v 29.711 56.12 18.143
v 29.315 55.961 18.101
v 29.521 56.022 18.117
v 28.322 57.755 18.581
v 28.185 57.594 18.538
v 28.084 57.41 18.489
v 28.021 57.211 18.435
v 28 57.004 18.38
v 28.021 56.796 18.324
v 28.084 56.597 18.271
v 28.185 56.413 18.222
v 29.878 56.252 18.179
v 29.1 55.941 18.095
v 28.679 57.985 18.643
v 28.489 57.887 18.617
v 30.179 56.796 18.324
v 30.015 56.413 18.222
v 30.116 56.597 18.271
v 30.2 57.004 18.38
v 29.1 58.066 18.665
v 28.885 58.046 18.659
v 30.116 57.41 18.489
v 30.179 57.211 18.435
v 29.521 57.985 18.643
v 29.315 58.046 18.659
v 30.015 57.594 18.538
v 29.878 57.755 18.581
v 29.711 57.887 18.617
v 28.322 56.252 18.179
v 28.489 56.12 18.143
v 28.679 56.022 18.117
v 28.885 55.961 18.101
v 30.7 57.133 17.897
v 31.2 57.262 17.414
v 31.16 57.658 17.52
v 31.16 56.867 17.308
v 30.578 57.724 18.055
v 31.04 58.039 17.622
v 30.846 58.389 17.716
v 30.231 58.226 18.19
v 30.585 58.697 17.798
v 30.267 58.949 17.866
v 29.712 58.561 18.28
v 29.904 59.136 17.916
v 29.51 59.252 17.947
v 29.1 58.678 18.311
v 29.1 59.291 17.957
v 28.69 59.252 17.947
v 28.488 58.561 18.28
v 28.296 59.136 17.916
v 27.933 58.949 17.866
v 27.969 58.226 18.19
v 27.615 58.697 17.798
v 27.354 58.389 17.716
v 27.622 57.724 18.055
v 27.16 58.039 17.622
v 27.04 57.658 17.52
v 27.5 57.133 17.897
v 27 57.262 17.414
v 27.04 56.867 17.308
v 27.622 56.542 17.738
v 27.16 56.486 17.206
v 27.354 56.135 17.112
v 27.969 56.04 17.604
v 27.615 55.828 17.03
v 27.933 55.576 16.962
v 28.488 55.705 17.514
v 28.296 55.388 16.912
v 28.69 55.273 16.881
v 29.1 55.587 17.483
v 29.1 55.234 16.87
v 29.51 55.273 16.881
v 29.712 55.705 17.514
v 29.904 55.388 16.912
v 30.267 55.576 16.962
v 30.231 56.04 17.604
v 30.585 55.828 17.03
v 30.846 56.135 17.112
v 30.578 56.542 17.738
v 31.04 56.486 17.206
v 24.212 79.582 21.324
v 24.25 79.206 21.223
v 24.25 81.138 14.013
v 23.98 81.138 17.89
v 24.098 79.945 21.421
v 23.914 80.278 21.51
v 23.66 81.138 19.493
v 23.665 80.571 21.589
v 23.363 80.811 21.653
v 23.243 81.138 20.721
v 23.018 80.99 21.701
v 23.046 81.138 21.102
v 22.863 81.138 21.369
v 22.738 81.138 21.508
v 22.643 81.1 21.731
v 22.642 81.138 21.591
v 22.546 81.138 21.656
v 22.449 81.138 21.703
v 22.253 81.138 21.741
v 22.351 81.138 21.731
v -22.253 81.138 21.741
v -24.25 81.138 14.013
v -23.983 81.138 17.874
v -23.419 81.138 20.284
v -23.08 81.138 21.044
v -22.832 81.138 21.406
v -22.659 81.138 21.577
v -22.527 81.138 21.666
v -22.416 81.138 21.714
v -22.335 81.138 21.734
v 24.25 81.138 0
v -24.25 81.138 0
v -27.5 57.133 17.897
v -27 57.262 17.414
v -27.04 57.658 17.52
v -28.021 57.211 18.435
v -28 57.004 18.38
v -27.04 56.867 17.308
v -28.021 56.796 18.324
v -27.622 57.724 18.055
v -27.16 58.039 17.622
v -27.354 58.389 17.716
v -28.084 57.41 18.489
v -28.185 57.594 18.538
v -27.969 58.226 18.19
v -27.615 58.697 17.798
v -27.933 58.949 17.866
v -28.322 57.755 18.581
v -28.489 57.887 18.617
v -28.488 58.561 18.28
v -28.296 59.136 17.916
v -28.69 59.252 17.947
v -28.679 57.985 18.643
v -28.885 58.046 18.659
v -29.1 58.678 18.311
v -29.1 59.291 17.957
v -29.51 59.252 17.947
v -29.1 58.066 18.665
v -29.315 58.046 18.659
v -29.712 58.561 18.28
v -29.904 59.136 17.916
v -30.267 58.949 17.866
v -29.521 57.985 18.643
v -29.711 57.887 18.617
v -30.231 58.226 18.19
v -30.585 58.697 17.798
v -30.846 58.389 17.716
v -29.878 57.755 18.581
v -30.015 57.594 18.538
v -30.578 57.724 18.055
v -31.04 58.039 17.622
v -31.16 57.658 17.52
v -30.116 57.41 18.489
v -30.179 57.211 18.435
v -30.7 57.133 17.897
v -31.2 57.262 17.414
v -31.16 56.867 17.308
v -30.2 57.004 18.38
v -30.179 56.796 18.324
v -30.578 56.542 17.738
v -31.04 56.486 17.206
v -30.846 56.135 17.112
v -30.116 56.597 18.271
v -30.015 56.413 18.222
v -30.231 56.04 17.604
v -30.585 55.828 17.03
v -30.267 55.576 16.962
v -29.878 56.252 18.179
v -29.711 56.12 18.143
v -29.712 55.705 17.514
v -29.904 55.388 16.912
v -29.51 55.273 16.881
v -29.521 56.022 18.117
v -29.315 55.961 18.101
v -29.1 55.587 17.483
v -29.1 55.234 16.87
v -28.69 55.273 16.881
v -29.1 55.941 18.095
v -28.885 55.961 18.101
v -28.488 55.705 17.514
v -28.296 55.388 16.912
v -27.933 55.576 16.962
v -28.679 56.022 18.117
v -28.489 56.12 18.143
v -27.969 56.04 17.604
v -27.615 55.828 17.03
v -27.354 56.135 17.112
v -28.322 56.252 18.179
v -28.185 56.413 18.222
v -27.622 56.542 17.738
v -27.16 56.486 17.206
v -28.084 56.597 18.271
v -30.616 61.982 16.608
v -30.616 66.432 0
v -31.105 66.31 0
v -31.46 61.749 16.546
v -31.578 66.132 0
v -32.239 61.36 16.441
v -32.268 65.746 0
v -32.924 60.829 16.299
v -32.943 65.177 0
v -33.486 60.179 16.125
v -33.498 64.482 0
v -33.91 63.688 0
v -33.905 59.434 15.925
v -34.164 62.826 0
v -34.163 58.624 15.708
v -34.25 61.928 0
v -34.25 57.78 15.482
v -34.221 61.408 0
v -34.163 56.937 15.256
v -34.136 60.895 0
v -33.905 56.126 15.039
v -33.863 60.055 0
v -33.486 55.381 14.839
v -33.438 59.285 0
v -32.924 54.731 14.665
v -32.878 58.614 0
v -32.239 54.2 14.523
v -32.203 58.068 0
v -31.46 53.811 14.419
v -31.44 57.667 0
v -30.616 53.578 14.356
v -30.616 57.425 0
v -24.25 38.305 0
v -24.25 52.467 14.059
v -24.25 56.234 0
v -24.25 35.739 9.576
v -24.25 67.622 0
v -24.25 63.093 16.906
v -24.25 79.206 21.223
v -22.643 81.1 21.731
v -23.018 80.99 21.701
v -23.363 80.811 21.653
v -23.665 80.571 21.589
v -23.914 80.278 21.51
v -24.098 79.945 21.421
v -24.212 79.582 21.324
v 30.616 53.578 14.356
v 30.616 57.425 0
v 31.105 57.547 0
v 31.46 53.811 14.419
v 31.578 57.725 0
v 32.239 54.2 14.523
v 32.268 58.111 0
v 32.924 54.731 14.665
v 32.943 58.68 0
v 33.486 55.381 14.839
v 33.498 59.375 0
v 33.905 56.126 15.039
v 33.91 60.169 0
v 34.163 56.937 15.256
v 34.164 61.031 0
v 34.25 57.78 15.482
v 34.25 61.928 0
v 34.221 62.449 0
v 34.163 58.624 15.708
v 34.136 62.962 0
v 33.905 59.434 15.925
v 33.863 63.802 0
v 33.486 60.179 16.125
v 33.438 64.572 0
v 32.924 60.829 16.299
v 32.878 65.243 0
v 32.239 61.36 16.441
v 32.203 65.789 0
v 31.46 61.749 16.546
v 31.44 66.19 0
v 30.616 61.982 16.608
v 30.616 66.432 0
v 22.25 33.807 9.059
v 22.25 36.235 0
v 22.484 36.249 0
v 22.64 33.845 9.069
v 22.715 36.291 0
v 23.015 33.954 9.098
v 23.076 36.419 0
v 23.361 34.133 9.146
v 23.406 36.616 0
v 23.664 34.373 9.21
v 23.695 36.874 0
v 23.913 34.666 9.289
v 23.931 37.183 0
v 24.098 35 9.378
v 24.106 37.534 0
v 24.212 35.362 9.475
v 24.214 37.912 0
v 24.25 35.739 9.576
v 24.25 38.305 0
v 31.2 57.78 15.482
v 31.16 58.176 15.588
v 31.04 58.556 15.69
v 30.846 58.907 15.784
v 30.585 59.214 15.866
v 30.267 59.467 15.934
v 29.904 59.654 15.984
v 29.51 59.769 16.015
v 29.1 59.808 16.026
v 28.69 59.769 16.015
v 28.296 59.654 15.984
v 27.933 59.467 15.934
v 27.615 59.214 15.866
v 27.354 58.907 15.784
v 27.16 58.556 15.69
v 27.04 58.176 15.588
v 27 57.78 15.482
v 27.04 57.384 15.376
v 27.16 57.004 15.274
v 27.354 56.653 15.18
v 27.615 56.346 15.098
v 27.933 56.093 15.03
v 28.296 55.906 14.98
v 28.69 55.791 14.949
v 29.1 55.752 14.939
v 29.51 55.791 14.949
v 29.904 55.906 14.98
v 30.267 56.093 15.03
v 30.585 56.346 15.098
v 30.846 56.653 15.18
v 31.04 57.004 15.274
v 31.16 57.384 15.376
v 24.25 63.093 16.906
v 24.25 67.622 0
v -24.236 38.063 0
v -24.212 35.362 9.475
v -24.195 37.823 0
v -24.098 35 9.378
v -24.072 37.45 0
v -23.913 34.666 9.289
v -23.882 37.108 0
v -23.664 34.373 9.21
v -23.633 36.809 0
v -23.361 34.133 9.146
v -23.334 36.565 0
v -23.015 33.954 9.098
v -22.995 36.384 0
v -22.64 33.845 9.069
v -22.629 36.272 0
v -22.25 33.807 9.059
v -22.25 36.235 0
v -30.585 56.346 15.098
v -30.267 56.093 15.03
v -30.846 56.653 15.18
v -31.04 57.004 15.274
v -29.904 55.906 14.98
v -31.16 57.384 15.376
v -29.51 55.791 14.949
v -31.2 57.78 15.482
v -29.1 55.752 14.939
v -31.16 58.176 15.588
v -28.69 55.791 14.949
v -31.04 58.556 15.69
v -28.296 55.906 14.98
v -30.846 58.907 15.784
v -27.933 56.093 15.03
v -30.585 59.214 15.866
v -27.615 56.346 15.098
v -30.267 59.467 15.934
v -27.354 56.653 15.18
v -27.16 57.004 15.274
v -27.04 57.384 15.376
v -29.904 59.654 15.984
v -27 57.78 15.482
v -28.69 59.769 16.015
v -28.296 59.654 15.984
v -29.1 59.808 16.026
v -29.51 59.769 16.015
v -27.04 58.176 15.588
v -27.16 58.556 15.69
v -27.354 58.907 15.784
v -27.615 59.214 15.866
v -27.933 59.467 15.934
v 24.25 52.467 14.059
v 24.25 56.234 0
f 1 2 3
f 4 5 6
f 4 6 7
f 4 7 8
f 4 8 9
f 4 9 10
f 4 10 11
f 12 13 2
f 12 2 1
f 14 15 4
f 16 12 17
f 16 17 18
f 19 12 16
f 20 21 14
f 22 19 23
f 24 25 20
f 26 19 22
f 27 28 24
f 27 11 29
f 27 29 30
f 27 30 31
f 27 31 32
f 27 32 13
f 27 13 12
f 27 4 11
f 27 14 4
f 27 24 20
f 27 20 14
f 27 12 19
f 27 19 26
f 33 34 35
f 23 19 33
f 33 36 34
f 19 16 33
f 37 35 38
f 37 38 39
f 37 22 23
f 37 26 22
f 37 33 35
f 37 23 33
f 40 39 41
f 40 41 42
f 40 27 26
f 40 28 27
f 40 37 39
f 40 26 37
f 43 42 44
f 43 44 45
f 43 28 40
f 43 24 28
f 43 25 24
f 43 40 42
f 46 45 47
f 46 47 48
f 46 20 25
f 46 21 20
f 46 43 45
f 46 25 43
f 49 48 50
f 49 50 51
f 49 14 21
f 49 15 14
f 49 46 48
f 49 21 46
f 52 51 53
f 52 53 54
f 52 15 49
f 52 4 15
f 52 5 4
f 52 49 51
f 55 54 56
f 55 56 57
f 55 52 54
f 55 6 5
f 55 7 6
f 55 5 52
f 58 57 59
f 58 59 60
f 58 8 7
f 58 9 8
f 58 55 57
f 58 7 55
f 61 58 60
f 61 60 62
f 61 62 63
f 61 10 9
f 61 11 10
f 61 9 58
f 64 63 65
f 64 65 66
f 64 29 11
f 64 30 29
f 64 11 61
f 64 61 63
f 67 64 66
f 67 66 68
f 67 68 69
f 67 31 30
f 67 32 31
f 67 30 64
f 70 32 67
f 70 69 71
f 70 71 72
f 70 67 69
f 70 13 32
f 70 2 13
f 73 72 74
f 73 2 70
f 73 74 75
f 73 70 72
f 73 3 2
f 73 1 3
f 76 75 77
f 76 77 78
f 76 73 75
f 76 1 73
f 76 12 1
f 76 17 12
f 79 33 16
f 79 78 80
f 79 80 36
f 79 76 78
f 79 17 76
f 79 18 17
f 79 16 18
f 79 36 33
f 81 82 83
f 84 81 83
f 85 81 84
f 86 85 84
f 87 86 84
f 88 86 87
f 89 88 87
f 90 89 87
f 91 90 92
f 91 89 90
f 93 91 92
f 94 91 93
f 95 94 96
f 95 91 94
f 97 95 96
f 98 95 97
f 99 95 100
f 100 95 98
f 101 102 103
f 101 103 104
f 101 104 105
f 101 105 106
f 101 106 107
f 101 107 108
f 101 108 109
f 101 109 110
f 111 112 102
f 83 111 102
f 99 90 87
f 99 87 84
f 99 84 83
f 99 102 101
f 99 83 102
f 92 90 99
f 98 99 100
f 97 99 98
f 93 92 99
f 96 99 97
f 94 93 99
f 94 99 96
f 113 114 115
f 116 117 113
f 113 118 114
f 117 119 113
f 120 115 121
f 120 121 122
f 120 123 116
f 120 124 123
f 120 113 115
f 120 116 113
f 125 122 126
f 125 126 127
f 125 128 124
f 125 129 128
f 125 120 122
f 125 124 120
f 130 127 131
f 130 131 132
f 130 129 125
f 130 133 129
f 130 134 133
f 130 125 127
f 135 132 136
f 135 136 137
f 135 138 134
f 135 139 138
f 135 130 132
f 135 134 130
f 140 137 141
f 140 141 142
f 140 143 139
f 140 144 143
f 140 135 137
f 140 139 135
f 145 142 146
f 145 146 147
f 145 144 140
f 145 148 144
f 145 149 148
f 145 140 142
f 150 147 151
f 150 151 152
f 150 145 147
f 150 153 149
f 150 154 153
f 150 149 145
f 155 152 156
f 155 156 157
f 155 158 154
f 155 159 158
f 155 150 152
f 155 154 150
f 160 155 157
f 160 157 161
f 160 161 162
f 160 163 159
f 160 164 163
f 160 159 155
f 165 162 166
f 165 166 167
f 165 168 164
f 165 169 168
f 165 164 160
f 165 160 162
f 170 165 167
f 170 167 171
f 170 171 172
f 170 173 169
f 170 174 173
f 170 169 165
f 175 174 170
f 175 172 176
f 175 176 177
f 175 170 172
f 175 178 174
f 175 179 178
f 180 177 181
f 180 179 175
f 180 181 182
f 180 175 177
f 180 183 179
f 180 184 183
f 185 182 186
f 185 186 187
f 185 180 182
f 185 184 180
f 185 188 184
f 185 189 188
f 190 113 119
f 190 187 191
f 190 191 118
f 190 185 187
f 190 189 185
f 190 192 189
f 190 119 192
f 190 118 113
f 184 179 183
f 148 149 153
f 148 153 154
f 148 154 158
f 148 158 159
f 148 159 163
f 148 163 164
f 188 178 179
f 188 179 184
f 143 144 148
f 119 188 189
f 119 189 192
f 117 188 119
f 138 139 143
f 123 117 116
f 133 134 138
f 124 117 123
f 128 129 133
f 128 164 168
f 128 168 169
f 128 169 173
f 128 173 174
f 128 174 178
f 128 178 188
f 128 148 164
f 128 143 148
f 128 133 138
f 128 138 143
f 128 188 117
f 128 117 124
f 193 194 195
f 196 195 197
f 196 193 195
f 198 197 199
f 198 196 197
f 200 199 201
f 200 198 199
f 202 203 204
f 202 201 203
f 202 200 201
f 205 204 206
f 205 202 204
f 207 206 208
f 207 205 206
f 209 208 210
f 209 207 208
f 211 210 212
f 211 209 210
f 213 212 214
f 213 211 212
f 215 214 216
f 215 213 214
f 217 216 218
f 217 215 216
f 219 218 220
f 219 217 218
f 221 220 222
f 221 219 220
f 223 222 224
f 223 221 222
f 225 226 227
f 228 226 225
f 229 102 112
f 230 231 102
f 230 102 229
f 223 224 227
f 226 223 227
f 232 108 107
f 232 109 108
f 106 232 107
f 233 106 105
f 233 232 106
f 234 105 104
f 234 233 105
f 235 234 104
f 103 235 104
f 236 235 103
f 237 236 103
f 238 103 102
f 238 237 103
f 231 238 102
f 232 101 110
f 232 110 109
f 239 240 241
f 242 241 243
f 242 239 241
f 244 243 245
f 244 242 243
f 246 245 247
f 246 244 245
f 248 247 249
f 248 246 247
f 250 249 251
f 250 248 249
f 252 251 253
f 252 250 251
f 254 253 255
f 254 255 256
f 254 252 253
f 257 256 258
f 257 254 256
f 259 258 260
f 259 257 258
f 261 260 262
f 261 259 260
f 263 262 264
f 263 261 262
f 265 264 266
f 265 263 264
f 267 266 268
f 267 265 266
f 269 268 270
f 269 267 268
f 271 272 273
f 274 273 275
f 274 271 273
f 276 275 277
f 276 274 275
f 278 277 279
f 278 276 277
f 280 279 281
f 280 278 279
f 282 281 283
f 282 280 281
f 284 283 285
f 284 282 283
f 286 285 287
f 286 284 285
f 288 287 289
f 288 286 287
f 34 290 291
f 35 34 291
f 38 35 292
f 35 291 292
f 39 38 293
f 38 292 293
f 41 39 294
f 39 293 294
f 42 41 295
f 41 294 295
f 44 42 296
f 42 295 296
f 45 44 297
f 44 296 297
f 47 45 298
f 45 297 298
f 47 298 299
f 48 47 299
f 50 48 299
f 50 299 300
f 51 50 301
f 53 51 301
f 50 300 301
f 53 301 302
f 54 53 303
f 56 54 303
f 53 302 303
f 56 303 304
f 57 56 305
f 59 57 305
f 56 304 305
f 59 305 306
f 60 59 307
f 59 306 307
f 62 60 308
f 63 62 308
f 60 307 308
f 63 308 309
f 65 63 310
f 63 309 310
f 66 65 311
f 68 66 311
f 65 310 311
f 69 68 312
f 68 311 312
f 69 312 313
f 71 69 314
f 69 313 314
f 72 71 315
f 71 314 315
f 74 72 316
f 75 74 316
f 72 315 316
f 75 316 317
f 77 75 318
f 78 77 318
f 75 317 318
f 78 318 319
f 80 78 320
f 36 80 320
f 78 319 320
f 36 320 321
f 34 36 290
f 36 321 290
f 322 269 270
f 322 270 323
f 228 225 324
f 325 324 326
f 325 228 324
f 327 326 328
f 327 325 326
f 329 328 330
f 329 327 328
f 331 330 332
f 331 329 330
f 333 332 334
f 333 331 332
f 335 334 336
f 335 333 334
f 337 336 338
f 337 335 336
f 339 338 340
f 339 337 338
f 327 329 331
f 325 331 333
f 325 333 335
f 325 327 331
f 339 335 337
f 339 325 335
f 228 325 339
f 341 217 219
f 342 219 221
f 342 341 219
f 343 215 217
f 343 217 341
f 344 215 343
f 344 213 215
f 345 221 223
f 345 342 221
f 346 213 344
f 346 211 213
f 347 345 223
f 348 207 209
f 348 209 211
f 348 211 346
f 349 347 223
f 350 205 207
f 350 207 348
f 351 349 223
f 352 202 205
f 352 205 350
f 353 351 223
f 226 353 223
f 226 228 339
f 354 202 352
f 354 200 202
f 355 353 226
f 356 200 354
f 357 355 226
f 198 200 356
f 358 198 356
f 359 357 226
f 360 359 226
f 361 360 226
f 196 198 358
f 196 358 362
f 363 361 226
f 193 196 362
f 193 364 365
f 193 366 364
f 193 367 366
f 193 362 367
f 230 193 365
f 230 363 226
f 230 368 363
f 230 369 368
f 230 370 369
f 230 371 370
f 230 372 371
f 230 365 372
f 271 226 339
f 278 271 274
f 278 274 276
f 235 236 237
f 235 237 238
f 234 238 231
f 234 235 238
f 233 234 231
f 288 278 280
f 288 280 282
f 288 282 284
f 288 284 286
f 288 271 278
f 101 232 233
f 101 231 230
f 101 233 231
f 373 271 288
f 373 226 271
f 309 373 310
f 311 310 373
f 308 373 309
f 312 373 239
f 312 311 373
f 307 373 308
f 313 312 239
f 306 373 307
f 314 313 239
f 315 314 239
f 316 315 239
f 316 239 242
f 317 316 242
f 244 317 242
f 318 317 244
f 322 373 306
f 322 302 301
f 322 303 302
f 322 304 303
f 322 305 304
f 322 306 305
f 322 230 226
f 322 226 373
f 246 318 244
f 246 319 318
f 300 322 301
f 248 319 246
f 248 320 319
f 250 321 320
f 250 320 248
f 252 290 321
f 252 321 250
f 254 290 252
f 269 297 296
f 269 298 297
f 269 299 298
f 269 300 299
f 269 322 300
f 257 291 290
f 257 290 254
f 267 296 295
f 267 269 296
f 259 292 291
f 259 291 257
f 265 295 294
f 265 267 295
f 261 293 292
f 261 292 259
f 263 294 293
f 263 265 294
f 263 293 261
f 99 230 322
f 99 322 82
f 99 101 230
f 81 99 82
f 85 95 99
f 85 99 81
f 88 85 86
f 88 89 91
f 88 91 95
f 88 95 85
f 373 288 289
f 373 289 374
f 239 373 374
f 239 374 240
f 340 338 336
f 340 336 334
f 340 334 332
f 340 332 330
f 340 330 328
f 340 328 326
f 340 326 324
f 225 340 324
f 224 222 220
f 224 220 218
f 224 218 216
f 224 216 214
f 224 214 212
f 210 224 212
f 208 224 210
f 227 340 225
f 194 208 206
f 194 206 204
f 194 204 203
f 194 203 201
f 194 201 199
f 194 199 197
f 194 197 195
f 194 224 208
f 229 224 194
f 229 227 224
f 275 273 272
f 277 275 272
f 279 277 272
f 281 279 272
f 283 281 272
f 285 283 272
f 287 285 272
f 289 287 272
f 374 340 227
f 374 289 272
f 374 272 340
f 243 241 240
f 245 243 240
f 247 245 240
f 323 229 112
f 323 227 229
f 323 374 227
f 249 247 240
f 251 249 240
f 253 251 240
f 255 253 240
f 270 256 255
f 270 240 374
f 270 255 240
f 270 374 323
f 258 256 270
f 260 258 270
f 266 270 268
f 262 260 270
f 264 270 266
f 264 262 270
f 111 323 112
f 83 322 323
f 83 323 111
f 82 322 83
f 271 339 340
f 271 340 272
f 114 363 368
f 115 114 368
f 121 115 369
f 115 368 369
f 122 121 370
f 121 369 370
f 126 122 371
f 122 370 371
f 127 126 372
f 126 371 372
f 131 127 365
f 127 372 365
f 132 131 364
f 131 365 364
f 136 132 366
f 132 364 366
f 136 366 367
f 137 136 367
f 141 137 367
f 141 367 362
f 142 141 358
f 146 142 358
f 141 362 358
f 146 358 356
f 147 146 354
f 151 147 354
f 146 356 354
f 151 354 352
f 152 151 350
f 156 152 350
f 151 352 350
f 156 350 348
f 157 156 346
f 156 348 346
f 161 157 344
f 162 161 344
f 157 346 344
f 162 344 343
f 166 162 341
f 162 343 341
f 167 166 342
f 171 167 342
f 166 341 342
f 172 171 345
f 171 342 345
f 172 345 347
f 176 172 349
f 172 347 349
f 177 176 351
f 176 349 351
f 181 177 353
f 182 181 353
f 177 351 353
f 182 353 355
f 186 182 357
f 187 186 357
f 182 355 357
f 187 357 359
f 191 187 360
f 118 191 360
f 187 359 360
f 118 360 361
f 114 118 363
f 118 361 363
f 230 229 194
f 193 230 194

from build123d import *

# Parameters (mm, degrees)
F1_DEPTH = 34.25
F2_R     = 2.1
F3_DEPTH = 30
F5_DEPTH = 3
F6_SIZE  = 1


with BuildPart() as f1:
    # F0 (on Right) → F1 (new body, symmetric)
    with BuildSketch(Plane.YZ):
        Polygon((81.137769, 21.7408), (0, 0), (81.137769, 0), align=None)
    extrude(amount=F1_DEPTH, both=True)


with BuildPart() as f3:
    # F2 (on face) → F3 (new body)
    with BuildSketch(Plane(origin=(0, 0, 0), x_dir=(1, 0, 0), z_dir=(0, -0.258819, 0.965926))):
        with BuildLine():
            Line((-22.25, 35), (0, 35))
            Line((0, 35), (0, 84))
            Line((0, 84), (-22.25, 84))
            ThreePointArc((-22.25, 84), (-23.664214, 83.414214), (-24.25, 82))
            Line((-24.25, 82), (-24.25, 65.318283))
            Line((-24.25, 65.318283), (-30.615681, 64.16811))
            ThreePointArc((-30.615681, 64.16811), (-34.25, 59.818283), (-30.615681, 55.468456))
            Line((-30.615681, 55.468456), (-24.25, 54.318283))
            Line((-24.25, 54.318283), (-24.25, 37))
            ThreePointArc((-24.25, 37), (-23.664214, 35.585786), (-22.25, 35))
        make_face()
        with Locations((-29.1, 59.818283)):
            Circle(F2_R, mode=Mode.SUBTRACT)
        with BuildLine():
            Line((0, 84), (0, 35))
            Line((0, 35), (22.25, 35))
            ThreePointArc((22.25, 35), (23.664214, 35.585786), (24.25, 37))
            Line((24.25, 37), (24.25, 54.318283))
            Line((24.25, 54.318283), (30.615681, 55.468456))
            ThreePointArc((30.615681, 55.468456), (34.25, 59.818283), (30.615681, 64.16811))
            Line((30.615681, 64.16811), (24.25, 65.318283))
            Line((24.25, 65.318283), (24.25, 82))
            ThreePointArc((24.25, 82), (23.664214, 83.414214), (22.25, 84))
            Line((22.25, 84), (0, 84))
        make_face()
        with Locations((29.1, 59.818283)):
            Circle(F2_R, mode=Mode.SUBTRACT)
        with Locations((29.1, 59.818283)):
            Circle(F2_R)
        with Locations((-29.1, 59.818283)):
            Circle(F2_R)
    extrude(amount=-F3_DEPTH)

    # F4: intersect F1
    add(f1.part, mode=Mode.INTERSECT)

    # F2 (on face) → F5 (join)
    with BuildSketch(Plane(origin=(0, 0, 0), x_dir=(1, 0, 0), z_dir=(0, -0.258819, 0.965926))):
        with Locations((29.1, 59.818283)):
            Circle(F2_R)
        with Locations((-29.1, 59.818283)):
            Circle(F2_R)
    extrude(amount=F5_DEPTH)

    # F6
    f6_edges = [f3.edges().sort_by_distance(p)[0] for p in [
        (27, 57.003567, 18.379888),
        (-31.2, 57.003567, 18.379888),
    ]]
    chamfer(f6_edges, length=F6_SIZE)


solid = f3.part
